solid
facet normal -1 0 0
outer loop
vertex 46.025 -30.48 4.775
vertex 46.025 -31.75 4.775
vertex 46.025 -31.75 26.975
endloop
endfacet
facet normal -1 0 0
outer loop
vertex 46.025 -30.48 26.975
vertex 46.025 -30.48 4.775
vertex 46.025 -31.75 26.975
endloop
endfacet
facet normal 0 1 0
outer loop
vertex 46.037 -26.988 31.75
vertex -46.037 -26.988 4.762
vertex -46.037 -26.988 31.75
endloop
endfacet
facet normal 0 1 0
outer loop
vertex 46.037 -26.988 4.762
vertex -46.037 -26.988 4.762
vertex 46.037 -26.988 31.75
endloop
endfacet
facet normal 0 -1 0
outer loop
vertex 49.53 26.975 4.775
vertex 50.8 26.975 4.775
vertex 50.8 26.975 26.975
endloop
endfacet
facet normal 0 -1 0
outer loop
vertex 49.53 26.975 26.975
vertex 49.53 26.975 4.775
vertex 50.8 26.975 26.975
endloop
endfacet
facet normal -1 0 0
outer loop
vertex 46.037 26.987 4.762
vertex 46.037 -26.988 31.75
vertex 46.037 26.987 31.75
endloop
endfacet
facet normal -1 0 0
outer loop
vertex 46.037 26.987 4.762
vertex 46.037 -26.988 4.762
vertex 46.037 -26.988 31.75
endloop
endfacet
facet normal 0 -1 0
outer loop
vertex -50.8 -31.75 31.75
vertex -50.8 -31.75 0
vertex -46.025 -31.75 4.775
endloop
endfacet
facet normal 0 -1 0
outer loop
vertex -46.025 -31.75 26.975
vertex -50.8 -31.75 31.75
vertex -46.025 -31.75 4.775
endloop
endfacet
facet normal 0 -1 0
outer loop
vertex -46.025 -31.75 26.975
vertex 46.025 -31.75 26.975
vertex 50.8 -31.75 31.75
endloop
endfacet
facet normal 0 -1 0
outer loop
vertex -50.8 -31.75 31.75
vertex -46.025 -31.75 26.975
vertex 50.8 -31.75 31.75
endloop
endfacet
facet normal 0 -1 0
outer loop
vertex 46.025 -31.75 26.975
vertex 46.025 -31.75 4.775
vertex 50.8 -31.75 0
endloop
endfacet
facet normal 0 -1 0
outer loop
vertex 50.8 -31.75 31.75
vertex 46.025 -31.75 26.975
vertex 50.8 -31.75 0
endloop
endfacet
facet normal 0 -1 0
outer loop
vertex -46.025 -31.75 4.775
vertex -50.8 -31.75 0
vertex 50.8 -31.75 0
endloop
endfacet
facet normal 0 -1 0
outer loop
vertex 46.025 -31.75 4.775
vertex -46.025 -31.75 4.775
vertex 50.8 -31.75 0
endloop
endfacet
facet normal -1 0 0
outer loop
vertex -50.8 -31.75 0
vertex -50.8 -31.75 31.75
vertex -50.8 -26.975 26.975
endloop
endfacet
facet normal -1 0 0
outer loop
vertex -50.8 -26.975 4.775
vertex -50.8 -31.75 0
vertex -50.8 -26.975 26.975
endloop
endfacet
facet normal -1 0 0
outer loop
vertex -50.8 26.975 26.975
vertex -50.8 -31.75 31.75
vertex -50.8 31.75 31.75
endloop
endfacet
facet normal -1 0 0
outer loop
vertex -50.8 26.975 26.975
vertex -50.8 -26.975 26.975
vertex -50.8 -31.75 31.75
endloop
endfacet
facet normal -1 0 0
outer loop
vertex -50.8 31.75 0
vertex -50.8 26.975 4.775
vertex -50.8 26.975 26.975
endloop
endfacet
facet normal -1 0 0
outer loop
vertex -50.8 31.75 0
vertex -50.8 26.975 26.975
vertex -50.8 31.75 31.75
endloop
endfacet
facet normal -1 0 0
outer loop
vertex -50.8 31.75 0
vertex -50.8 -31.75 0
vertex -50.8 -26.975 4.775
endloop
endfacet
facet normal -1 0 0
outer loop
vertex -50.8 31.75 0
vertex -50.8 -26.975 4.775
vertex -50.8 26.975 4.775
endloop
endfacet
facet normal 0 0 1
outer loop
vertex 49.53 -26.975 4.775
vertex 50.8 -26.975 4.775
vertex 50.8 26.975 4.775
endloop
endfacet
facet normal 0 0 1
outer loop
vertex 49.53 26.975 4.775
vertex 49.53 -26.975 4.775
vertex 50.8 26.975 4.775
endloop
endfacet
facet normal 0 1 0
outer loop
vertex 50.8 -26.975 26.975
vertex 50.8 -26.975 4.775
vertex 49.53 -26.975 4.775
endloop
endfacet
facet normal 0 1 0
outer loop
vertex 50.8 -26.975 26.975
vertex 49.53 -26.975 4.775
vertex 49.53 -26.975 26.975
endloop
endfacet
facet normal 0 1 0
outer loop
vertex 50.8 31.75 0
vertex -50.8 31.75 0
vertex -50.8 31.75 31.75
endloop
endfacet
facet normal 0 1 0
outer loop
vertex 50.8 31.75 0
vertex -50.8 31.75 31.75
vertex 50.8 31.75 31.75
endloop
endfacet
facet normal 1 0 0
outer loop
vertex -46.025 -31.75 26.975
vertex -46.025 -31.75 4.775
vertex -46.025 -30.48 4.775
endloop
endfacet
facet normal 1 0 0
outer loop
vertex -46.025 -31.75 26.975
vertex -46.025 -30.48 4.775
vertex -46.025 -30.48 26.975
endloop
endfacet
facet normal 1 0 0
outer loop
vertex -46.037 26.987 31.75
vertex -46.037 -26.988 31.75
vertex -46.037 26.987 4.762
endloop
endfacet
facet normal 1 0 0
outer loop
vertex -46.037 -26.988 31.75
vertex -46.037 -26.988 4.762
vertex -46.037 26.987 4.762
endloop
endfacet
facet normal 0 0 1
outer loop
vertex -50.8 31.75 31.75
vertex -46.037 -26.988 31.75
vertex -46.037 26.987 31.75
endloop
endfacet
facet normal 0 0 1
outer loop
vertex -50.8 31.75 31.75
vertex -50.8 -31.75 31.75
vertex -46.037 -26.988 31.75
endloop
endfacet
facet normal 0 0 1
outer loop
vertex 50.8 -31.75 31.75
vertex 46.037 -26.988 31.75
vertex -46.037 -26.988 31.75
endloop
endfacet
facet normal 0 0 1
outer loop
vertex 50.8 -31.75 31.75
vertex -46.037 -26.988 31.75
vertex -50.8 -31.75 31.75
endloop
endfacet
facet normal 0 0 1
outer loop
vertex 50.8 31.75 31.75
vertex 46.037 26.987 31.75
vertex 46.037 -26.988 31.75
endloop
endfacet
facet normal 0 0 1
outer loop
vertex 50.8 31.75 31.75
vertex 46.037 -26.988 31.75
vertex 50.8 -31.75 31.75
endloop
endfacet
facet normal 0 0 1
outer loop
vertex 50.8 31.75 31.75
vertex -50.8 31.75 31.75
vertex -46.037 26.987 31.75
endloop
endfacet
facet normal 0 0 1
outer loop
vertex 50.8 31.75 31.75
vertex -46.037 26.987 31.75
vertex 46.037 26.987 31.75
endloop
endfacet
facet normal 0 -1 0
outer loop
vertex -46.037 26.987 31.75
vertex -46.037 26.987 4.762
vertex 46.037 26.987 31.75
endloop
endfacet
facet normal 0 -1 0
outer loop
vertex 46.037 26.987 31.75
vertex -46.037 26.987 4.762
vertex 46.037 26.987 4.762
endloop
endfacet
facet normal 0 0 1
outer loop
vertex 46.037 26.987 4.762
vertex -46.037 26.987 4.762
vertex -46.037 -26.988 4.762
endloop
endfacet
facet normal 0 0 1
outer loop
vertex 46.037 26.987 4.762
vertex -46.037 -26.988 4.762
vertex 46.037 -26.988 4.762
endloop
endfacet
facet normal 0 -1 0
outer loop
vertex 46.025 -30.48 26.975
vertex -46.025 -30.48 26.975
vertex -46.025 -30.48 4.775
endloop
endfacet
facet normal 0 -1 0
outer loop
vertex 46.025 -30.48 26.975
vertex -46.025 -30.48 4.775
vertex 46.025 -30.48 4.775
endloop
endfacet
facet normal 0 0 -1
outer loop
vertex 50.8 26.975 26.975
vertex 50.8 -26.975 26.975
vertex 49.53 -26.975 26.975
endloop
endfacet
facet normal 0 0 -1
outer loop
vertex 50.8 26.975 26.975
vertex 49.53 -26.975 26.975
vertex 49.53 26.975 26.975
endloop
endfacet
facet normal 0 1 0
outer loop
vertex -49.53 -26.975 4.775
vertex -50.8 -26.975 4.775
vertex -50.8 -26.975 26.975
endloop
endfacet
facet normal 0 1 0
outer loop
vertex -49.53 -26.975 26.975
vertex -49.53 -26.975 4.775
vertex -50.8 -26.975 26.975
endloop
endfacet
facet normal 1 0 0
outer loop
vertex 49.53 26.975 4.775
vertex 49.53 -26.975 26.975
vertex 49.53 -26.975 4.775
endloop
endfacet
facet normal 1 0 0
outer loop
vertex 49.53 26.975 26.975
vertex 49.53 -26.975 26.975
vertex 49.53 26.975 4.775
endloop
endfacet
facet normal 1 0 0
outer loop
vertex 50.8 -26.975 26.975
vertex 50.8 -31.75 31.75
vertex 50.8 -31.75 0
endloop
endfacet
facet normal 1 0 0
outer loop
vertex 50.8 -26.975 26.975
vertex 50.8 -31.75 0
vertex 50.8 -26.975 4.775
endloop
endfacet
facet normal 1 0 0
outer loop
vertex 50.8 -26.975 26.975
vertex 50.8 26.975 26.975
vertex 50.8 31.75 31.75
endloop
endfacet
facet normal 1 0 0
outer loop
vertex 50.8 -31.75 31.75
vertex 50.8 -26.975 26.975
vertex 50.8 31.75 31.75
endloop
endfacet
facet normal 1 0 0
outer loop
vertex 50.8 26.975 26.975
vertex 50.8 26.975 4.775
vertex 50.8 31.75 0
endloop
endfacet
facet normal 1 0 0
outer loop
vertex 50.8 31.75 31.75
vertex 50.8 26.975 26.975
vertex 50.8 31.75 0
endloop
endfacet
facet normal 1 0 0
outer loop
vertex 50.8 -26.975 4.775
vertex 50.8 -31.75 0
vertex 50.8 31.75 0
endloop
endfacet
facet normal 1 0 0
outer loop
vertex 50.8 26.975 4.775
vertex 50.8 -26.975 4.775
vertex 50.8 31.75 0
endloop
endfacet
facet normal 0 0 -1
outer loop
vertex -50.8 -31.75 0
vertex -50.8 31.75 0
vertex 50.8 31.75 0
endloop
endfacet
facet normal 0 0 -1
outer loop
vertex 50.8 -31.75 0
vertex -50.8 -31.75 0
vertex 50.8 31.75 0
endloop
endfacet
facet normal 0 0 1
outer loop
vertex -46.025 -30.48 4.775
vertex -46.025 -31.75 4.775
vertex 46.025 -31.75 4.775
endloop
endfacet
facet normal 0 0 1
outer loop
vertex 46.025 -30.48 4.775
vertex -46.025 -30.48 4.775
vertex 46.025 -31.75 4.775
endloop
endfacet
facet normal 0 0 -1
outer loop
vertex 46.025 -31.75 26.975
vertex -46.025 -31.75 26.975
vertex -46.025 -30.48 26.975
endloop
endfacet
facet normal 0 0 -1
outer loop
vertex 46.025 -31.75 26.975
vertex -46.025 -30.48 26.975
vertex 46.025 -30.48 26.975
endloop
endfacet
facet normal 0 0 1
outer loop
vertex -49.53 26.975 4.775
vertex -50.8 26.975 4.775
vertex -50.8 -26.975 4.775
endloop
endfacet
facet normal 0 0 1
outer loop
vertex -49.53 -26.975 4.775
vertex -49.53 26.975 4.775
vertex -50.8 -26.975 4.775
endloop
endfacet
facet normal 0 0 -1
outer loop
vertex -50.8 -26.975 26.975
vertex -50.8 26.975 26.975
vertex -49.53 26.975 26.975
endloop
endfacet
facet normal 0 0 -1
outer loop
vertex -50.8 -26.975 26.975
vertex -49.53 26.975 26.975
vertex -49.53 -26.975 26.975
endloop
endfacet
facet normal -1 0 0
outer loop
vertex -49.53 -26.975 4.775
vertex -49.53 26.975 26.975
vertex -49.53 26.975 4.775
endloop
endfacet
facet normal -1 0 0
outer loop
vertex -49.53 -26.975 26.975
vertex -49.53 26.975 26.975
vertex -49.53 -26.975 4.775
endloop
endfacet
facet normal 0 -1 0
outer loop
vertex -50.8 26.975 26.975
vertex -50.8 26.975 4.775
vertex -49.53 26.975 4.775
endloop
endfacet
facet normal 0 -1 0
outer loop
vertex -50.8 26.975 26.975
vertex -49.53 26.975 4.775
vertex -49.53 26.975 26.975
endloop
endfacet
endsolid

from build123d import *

# Parameters (mm, degrees)
F0_W     = 101.6
F0_H     = 63.5
F1_DEPTH = 31.75
F2_T     = -4.7625
F4_W     = 53.9496
F4_H     = 22.1996
F6_DEPTH = 1.27
F3_W     = 92.0496
F3_H     = 22.1996
F7_DEPTH = 1.27
F5_W     = 53.9496
F5_H     = 22.1996
F8_DEPTH = 1.27


with BuildPart() as f1:
    # F0 (on Top) → F1 (new body)
    with BuildSketch(Plane.XY):
        Rectangle(F0_W, F0_H)
    extrude(amount=F1_DEPTH)

    # F2
    f2_openings = [f1.faces().sort_by_distance(p)[0] for p in [
        (0, 0, 31.75),
    ]]
    offset(amount=F2_T, openings=f2_openings)

    # F4 (on face) → F6 (cut)
    with BuildSketch(Plane.YZ.offset(50.8)):
        with Locations((0, 15.875)):
            Rectangle(F4_W, F4_H)
    extrude(amount=-F6_DEPTH, mode=Mode.SUBTRACT)

    # F3 (on face) → F7 (cut)
    with BuildSketch(Plane.XZ.offset(31.75)):
        with Locations((0, 15.875)):
            Rectangle(F3_W, F3_H)
    extrude(amount=-F7_DEPTH, mode=Mode.SUBTRACT)

    # F5 (on face) → F8 (cut)
    with BuildSketch(Plane(origin=(-50.8, 0, 0), x_dir=(0, -1, 0), z_dir=(-1, 0, 0))):
        with Locations((0, 15.875)):
            Rectangle(F5_W, F5_H)
    extrude(amount=-F8_DEPTH, mode=Mode.SUBTRACT)


solid = f1.part
